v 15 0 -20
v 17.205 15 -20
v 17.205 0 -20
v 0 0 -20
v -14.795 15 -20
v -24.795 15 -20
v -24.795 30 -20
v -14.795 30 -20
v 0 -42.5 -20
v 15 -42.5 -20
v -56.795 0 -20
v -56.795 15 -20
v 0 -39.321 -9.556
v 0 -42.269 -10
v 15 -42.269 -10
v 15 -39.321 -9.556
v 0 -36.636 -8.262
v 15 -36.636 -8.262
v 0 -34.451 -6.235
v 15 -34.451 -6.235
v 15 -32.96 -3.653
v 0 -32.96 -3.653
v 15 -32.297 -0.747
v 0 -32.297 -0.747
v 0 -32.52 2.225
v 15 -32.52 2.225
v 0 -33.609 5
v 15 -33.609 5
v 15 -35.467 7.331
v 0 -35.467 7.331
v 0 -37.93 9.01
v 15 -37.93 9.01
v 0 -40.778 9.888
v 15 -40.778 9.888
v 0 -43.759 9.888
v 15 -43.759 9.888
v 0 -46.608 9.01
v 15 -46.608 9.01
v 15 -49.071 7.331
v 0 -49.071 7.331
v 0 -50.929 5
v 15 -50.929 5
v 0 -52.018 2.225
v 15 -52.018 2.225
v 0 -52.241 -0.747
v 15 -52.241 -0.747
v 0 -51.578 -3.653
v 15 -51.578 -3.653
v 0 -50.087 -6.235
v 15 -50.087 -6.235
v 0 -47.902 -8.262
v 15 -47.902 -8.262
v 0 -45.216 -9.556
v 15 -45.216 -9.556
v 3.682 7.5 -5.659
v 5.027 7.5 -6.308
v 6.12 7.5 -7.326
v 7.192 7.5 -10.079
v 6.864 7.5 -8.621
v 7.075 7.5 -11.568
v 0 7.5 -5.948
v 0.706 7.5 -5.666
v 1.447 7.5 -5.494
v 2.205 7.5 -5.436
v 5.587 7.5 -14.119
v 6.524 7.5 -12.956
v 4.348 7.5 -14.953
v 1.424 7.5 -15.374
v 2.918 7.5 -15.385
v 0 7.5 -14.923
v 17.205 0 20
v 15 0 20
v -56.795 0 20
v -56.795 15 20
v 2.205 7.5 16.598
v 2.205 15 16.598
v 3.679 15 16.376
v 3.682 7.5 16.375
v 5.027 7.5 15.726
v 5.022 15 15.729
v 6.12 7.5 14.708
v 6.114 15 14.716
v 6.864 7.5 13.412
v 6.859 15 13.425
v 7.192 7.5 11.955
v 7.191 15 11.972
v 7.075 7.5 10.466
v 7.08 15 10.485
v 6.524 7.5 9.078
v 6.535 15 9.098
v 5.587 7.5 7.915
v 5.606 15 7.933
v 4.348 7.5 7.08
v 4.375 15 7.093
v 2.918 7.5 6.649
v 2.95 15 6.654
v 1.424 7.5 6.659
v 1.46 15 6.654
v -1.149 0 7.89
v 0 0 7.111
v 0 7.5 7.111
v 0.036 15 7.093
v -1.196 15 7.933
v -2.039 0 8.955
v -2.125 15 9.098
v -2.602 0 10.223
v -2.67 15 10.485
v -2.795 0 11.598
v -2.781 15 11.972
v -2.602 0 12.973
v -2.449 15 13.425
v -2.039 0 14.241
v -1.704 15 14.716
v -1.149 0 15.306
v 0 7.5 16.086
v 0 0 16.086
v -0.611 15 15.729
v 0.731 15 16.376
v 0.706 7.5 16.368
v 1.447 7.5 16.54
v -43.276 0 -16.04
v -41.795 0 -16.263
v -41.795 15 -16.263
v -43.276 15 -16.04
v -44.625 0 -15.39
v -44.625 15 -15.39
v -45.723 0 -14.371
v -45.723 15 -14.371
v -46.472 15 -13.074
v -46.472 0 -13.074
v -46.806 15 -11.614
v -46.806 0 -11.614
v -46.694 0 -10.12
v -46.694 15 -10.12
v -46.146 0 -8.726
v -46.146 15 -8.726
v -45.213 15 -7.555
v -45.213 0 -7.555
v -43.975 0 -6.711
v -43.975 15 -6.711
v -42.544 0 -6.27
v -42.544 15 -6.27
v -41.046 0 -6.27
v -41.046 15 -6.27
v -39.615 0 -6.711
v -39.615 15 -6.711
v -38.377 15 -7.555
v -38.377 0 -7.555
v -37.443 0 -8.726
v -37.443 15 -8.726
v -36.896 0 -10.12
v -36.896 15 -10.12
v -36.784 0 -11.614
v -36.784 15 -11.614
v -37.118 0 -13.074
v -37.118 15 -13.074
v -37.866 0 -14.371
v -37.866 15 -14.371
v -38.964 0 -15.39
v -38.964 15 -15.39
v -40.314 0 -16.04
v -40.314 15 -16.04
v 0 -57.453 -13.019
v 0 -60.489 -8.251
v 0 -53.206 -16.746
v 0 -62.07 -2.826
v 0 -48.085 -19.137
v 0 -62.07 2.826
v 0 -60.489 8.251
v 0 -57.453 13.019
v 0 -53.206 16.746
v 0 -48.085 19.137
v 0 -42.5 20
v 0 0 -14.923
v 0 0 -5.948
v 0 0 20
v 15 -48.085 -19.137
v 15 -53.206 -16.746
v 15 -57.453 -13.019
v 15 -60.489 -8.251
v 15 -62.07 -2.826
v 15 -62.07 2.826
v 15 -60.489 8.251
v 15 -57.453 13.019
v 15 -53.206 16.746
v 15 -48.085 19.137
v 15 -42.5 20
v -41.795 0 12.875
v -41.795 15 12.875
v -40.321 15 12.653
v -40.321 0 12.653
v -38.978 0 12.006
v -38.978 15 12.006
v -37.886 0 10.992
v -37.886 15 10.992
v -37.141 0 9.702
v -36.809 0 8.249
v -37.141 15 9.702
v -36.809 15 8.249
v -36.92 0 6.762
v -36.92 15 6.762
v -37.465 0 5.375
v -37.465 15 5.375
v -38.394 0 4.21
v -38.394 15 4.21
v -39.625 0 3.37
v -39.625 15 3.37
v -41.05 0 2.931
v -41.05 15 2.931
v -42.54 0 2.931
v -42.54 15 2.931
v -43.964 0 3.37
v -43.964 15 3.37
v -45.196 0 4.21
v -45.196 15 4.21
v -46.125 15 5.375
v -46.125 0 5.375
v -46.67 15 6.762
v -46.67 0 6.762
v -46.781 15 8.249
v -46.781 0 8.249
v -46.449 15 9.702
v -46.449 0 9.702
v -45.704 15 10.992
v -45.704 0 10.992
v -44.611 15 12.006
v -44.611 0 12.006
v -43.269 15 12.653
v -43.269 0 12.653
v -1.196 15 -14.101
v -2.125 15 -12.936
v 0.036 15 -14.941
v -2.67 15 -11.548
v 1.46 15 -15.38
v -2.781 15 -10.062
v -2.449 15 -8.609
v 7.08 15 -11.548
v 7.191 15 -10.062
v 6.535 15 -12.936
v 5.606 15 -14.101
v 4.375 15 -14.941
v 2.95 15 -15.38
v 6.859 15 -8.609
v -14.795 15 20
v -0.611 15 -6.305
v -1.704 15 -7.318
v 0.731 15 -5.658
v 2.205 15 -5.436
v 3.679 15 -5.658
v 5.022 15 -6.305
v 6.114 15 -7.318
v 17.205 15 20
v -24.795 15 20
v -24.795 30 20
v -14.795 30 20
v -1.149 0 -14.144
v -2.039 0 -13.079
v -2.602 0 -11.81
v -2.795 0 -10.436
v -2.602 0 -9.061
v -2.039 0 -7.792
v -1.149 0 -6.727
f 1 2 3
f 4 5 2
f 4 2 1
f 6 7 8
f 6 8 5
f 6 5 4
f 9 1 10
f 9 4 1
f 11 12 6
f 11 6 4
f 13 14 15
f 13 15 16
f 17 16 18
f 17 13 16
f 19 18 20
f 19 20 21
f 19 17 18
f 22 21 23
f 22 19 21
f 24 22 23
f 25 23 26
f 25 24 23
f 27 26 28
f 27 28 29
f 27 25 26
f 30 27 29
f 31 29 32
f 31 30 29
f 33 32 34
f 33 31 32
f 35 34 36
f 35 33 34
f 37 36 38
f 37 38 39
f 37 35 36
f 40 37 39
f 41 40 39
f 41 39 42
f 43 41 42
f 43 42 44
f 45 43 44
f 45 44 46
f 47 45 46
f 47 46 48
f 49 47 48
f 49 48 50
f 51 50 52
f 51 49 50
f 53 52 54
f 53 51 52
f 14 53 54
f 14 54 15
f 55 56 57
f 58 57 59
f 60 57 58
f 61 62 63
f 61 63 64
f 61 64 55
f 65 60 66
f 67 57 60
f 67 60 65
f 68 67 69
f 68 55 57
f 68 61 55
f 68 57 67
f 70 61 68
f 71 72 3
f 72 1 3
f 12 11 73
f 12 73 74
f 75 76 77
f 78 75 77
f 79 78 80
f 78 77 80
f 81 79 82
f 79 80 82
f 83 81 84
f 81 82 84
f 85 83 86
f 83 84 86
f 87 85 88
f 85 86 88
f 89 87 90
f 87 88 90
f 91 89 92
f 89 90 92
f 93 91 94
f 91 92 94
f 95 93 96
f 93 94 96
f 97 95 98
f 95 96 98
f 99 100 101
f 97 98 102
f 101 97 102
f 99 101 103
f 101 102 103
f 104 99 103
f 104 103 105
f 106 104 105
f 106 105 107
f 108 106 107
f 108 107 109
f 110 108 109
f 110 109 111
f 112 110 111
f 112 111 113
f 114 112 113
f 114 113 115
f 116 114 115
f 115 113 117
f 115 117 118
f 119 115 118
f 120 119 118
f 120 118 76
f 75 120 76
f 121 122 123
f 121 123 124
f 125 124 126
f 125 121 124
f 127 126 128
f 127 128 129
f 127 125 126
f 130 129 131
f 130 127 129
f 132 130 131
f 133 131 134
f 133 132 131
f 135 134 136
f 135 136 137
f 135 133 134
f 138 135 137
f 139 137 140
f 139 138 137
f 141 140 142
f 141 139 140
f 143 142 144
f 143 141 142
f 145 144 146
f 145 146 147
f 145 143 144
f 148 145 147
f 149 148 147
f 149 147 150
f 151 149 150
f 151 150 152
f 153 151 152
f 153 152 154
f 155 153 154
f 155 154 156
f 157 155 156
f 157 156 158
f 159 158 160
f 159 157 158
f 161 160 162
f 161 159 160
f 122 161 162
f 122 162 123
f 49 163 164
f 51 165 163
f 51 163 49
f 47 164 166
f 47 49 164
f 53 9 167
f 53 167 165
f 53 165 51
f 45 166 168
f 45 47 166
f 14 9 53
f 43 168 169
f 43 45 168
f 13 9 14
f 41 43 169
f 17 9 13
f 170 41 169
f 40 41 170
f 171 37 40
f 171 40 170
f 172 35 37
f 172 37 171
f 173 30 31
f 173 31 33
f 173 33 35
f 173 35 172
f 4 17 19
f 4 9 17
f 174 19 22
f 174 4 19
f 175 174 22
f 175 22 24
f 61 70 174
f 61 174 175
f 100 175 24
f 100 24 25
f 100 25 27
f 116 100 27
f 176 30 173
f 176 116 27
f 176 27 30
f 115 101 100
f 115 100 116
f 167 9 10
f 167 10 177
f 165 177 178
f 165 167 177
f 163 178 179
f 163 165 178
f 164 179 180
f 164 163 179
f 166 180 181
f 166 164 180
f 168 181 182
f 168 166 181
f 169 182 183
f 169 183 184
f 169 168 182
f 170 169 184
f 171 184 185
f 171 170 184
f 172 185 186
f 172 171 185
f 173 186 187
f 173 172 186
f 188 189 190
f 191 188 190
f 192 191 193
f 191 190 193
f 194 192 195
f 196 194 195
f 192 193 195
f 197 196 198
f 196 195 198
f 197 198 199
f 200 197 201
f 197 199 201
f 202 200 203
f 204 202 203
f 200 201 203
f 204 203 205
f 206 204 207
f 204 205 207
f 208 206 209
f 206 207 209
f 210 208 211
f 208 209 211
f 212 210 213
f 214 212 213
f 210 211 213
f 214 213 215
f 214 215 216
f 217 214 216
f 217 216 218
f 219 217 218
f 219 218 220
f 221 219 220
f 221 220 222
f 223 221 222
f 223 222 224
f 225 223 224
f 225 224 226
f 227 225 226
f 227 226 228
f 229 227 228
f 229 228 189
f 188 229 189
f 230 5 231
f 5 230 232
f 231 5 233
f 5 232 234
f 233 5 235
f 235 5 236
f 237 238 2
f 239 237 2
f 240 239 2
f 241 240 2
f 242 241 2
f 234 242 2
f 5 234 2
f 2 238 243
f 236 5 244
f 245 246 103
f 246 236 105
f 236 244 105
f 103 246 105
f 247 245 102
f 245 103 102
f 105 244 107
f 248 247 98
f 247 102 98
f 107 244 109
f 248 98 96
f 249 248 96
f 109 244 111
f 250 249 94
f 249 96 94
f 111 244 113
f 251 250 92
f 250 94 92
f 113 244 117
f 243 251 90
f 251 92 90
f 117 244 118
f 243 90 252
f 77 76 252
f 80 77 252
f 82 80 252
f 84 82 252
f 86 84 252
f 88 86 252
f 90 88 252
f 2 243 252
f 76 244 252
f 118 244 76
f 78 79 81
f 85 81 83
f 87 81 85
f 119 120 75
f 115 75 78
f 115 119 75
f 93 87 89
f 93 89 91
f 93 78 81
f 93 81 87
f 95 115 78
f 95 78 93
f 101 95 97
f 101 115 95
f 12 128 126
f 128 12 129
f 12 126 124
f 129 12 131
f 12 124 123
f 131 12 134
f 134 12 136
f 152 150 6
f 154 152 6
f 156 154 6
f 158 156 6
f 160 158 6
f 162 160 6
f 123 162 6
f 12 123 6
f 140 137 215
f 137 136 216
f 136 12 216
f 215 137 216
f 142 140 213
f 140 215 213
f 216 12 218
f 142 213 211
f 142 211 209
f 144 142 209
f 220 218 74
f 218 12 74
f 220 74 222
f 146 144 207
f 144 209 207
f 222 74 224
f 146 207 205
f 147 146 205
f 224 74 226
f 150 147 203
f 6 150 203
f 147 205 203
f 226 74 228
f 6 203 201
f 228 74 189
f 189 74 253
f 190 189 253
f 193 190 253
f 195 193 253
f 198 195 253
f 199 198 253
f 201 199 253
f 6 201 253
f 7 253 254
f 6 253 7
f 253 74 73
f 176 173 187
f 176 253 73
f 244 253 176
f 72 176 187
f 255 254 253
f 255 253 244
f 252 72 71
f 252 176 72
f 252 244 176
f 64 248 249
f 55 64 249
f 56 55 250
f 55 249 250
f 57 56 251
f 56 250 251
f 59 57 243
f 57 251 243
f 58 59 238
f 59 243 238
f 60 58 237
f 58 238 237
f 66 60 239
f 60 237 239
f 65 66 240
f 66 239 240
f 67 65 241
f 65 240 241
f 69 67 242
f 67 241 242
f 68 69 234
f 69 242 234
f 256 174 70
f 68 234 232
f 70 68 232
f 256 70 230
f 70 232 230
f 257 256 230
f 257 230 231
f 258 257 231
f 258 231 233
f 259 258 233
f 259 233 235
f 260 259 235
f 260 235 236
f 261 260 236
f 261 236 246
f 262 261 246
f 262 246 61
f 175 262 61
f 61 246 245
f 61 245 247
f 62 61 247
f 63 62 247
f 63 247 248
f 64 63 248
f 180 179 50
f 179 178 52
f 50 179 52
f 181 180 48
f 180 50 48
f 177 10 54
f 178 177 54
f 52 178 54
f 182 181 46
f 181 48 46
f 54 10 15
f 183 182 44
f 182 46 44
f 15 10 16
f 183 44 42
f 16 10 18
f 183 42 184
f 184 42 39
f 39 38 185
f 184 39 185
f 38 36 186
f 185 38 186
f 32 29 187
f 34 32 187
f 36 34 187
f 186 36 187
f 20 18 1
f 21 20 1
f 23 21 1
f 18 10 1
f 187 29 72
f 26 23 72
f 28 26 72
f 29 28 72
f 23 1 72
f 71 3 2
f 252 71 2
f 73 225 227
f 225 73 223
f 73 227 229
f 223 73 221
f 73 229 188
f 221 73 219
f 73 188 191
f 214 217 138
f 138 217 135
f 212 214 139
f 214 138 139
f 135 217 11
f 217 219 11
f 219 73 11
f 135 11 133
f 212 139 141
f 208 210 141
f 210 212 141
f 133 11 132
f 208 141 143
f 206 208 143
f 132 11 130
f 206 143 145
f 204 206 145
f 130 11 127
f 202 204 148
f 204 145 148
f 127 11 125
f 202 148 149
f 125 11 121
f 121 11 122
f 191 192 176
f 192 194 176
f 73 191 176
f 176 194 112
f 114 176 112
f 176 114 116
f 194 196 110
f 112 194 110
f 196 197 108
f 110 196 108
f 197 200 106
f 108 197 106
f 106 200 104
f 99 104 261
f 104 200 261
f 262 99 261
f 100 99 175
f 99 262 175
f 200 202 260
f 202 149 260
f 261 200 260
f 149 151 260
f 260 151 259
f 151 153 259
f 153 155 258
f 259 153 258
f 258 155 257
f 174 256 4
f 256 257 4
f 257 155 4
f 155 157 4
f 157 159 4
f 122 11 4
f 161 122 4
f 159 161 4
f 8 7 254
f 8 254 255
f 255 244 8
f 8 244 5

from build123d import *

# Parameters (mm, degrees)
SKETCH1_W           = 74
SKETCH1_H           = 15
BOSS_EXTRUDE1_DEPTH = 20
SKETCH2_W           = 10
SKETCH2_H           = 40
BOSS_EXTRUDE2_DEPTH = 30
SKETCH3_R           = 5.024696106
CUT_EXTRUDE4_DEPTH  = 15
SKETCH6_R           = 5
CUT_EXTRUDE5_DEPTH  = 30
SKETCH8_R           = 5
CUT_EXTRUDE6_DEPTH  = 30
SKETCH9_R           = 5
CUT_EXTRUDE7_DEPTH  = 30
SKETCH11_R          = 10
BOSS_EXTRUDE3_DEPTH = 15


with BuildPart() as part:
    # Sketch1 → Boss-Extrude1 (new, symmetric)
    with BuildSketch(Plane.XY):
        with Locations((-19.794871795, 7.5)):
            Rectangle(SKETCH1_W, SKETCH1_H)
    extrude(amount=BOSS_EXTRUDE1_DEPTH, both=True)

    # Sketch2 → Boss-Extrude2 (add)
    with BuildSketch(Plane(origin=(0, 0, 0), x_dir=(1, 0, 0), z_dir=(0, 1, 0))):
        with Locations((-19.794871795, 0)):
            Rectangle(SKETCH2_W, SKETCH2_H)
    extrude(amount=BOSS_EXTRUDE2_DEPTH)

    # Sketch3 → Cut-Extrude4 (cut)
    with BuildSketch(Plane(origin=(0, 0, 0), x_dir=(1, 0, 0), z_dir=(0, 1, 0))):
        with Locations(Location((-41.794871795, 11.238480193, 0), (0, 0, 90))):
            Circle(SKETCH3_R)
    extrude(amount=CUT_EXTRUDE4_DEPTH, mode=Mode.SUBTRACT)

    # Sketch6 → Cut-Extrude5 (cut)
    with BuildSketch(Plane(origin=(0, 15, 0), x_dir=(1, 0, 0), z_dir=(0, 1, 0))):
        with Locations(Location((-41.794871795, -7.874935053, 0), (0, 0, 270))):
            Circle(SKETCH6_R)
    extrude(amount=-CUT_EXTRUDE5_DEPTH, mode=Mode.SUBTRACT)

    # Sketch8 → Cut-Extrude6 (cut)
    with BuildSketch(Plane(origin=(0, 15, 0), x_dir=(1, 0, 0), z_dir=(0, 1, 0))):
        with Locations(Location((2.205128205, 10.435706621, 0), (0, 0, 270))):
            Circle(SKETCH8_R)
    extrude(amount=-CUT_EXTRUDE6_DEPTH, mode=Mode.SUBTRACT)

    # Sketch9 → Cut-Extrude7 (cut)
    with BuildSketch(Plane(origin=(0, 15, 0), x_dir=(1, 0, 0), z_dir=(0, 1, 0))):
        with Locations(Location((2.205128205, -11.598088542, 0), (0, 0, 270))):
            Circle(SKETCH9_R)
    extrude(amount=-CUT_EXTRUDE7_DEPTH, mode=Mode.SUBTRACT)

    # Sketch11 → Boss-Extrude3 (add)
    with BuildSketch(Plane(origin=(0, 0, 0), x_dir=(0, 0, -1), z_dir=(1, 0, 0))):
        with BuildLine():
            Line((-20, 7.5), (20, 7.5))
            Line((20, 7.5), (20, -42.5))
            ThreePointArc((20, -42.5), (0, -62.270254711), (-20, -42.5))
            Line((-20, -42.5), (-20, 7.5))
        make_face()
        with Locations((0, -42.268919804)):
            Circle(SKETCH11_R, mode=Mode.SUBTRACT)
    extrude(amount=BOSS_EXTRUDE3_DEPTH)


solid = part.part
